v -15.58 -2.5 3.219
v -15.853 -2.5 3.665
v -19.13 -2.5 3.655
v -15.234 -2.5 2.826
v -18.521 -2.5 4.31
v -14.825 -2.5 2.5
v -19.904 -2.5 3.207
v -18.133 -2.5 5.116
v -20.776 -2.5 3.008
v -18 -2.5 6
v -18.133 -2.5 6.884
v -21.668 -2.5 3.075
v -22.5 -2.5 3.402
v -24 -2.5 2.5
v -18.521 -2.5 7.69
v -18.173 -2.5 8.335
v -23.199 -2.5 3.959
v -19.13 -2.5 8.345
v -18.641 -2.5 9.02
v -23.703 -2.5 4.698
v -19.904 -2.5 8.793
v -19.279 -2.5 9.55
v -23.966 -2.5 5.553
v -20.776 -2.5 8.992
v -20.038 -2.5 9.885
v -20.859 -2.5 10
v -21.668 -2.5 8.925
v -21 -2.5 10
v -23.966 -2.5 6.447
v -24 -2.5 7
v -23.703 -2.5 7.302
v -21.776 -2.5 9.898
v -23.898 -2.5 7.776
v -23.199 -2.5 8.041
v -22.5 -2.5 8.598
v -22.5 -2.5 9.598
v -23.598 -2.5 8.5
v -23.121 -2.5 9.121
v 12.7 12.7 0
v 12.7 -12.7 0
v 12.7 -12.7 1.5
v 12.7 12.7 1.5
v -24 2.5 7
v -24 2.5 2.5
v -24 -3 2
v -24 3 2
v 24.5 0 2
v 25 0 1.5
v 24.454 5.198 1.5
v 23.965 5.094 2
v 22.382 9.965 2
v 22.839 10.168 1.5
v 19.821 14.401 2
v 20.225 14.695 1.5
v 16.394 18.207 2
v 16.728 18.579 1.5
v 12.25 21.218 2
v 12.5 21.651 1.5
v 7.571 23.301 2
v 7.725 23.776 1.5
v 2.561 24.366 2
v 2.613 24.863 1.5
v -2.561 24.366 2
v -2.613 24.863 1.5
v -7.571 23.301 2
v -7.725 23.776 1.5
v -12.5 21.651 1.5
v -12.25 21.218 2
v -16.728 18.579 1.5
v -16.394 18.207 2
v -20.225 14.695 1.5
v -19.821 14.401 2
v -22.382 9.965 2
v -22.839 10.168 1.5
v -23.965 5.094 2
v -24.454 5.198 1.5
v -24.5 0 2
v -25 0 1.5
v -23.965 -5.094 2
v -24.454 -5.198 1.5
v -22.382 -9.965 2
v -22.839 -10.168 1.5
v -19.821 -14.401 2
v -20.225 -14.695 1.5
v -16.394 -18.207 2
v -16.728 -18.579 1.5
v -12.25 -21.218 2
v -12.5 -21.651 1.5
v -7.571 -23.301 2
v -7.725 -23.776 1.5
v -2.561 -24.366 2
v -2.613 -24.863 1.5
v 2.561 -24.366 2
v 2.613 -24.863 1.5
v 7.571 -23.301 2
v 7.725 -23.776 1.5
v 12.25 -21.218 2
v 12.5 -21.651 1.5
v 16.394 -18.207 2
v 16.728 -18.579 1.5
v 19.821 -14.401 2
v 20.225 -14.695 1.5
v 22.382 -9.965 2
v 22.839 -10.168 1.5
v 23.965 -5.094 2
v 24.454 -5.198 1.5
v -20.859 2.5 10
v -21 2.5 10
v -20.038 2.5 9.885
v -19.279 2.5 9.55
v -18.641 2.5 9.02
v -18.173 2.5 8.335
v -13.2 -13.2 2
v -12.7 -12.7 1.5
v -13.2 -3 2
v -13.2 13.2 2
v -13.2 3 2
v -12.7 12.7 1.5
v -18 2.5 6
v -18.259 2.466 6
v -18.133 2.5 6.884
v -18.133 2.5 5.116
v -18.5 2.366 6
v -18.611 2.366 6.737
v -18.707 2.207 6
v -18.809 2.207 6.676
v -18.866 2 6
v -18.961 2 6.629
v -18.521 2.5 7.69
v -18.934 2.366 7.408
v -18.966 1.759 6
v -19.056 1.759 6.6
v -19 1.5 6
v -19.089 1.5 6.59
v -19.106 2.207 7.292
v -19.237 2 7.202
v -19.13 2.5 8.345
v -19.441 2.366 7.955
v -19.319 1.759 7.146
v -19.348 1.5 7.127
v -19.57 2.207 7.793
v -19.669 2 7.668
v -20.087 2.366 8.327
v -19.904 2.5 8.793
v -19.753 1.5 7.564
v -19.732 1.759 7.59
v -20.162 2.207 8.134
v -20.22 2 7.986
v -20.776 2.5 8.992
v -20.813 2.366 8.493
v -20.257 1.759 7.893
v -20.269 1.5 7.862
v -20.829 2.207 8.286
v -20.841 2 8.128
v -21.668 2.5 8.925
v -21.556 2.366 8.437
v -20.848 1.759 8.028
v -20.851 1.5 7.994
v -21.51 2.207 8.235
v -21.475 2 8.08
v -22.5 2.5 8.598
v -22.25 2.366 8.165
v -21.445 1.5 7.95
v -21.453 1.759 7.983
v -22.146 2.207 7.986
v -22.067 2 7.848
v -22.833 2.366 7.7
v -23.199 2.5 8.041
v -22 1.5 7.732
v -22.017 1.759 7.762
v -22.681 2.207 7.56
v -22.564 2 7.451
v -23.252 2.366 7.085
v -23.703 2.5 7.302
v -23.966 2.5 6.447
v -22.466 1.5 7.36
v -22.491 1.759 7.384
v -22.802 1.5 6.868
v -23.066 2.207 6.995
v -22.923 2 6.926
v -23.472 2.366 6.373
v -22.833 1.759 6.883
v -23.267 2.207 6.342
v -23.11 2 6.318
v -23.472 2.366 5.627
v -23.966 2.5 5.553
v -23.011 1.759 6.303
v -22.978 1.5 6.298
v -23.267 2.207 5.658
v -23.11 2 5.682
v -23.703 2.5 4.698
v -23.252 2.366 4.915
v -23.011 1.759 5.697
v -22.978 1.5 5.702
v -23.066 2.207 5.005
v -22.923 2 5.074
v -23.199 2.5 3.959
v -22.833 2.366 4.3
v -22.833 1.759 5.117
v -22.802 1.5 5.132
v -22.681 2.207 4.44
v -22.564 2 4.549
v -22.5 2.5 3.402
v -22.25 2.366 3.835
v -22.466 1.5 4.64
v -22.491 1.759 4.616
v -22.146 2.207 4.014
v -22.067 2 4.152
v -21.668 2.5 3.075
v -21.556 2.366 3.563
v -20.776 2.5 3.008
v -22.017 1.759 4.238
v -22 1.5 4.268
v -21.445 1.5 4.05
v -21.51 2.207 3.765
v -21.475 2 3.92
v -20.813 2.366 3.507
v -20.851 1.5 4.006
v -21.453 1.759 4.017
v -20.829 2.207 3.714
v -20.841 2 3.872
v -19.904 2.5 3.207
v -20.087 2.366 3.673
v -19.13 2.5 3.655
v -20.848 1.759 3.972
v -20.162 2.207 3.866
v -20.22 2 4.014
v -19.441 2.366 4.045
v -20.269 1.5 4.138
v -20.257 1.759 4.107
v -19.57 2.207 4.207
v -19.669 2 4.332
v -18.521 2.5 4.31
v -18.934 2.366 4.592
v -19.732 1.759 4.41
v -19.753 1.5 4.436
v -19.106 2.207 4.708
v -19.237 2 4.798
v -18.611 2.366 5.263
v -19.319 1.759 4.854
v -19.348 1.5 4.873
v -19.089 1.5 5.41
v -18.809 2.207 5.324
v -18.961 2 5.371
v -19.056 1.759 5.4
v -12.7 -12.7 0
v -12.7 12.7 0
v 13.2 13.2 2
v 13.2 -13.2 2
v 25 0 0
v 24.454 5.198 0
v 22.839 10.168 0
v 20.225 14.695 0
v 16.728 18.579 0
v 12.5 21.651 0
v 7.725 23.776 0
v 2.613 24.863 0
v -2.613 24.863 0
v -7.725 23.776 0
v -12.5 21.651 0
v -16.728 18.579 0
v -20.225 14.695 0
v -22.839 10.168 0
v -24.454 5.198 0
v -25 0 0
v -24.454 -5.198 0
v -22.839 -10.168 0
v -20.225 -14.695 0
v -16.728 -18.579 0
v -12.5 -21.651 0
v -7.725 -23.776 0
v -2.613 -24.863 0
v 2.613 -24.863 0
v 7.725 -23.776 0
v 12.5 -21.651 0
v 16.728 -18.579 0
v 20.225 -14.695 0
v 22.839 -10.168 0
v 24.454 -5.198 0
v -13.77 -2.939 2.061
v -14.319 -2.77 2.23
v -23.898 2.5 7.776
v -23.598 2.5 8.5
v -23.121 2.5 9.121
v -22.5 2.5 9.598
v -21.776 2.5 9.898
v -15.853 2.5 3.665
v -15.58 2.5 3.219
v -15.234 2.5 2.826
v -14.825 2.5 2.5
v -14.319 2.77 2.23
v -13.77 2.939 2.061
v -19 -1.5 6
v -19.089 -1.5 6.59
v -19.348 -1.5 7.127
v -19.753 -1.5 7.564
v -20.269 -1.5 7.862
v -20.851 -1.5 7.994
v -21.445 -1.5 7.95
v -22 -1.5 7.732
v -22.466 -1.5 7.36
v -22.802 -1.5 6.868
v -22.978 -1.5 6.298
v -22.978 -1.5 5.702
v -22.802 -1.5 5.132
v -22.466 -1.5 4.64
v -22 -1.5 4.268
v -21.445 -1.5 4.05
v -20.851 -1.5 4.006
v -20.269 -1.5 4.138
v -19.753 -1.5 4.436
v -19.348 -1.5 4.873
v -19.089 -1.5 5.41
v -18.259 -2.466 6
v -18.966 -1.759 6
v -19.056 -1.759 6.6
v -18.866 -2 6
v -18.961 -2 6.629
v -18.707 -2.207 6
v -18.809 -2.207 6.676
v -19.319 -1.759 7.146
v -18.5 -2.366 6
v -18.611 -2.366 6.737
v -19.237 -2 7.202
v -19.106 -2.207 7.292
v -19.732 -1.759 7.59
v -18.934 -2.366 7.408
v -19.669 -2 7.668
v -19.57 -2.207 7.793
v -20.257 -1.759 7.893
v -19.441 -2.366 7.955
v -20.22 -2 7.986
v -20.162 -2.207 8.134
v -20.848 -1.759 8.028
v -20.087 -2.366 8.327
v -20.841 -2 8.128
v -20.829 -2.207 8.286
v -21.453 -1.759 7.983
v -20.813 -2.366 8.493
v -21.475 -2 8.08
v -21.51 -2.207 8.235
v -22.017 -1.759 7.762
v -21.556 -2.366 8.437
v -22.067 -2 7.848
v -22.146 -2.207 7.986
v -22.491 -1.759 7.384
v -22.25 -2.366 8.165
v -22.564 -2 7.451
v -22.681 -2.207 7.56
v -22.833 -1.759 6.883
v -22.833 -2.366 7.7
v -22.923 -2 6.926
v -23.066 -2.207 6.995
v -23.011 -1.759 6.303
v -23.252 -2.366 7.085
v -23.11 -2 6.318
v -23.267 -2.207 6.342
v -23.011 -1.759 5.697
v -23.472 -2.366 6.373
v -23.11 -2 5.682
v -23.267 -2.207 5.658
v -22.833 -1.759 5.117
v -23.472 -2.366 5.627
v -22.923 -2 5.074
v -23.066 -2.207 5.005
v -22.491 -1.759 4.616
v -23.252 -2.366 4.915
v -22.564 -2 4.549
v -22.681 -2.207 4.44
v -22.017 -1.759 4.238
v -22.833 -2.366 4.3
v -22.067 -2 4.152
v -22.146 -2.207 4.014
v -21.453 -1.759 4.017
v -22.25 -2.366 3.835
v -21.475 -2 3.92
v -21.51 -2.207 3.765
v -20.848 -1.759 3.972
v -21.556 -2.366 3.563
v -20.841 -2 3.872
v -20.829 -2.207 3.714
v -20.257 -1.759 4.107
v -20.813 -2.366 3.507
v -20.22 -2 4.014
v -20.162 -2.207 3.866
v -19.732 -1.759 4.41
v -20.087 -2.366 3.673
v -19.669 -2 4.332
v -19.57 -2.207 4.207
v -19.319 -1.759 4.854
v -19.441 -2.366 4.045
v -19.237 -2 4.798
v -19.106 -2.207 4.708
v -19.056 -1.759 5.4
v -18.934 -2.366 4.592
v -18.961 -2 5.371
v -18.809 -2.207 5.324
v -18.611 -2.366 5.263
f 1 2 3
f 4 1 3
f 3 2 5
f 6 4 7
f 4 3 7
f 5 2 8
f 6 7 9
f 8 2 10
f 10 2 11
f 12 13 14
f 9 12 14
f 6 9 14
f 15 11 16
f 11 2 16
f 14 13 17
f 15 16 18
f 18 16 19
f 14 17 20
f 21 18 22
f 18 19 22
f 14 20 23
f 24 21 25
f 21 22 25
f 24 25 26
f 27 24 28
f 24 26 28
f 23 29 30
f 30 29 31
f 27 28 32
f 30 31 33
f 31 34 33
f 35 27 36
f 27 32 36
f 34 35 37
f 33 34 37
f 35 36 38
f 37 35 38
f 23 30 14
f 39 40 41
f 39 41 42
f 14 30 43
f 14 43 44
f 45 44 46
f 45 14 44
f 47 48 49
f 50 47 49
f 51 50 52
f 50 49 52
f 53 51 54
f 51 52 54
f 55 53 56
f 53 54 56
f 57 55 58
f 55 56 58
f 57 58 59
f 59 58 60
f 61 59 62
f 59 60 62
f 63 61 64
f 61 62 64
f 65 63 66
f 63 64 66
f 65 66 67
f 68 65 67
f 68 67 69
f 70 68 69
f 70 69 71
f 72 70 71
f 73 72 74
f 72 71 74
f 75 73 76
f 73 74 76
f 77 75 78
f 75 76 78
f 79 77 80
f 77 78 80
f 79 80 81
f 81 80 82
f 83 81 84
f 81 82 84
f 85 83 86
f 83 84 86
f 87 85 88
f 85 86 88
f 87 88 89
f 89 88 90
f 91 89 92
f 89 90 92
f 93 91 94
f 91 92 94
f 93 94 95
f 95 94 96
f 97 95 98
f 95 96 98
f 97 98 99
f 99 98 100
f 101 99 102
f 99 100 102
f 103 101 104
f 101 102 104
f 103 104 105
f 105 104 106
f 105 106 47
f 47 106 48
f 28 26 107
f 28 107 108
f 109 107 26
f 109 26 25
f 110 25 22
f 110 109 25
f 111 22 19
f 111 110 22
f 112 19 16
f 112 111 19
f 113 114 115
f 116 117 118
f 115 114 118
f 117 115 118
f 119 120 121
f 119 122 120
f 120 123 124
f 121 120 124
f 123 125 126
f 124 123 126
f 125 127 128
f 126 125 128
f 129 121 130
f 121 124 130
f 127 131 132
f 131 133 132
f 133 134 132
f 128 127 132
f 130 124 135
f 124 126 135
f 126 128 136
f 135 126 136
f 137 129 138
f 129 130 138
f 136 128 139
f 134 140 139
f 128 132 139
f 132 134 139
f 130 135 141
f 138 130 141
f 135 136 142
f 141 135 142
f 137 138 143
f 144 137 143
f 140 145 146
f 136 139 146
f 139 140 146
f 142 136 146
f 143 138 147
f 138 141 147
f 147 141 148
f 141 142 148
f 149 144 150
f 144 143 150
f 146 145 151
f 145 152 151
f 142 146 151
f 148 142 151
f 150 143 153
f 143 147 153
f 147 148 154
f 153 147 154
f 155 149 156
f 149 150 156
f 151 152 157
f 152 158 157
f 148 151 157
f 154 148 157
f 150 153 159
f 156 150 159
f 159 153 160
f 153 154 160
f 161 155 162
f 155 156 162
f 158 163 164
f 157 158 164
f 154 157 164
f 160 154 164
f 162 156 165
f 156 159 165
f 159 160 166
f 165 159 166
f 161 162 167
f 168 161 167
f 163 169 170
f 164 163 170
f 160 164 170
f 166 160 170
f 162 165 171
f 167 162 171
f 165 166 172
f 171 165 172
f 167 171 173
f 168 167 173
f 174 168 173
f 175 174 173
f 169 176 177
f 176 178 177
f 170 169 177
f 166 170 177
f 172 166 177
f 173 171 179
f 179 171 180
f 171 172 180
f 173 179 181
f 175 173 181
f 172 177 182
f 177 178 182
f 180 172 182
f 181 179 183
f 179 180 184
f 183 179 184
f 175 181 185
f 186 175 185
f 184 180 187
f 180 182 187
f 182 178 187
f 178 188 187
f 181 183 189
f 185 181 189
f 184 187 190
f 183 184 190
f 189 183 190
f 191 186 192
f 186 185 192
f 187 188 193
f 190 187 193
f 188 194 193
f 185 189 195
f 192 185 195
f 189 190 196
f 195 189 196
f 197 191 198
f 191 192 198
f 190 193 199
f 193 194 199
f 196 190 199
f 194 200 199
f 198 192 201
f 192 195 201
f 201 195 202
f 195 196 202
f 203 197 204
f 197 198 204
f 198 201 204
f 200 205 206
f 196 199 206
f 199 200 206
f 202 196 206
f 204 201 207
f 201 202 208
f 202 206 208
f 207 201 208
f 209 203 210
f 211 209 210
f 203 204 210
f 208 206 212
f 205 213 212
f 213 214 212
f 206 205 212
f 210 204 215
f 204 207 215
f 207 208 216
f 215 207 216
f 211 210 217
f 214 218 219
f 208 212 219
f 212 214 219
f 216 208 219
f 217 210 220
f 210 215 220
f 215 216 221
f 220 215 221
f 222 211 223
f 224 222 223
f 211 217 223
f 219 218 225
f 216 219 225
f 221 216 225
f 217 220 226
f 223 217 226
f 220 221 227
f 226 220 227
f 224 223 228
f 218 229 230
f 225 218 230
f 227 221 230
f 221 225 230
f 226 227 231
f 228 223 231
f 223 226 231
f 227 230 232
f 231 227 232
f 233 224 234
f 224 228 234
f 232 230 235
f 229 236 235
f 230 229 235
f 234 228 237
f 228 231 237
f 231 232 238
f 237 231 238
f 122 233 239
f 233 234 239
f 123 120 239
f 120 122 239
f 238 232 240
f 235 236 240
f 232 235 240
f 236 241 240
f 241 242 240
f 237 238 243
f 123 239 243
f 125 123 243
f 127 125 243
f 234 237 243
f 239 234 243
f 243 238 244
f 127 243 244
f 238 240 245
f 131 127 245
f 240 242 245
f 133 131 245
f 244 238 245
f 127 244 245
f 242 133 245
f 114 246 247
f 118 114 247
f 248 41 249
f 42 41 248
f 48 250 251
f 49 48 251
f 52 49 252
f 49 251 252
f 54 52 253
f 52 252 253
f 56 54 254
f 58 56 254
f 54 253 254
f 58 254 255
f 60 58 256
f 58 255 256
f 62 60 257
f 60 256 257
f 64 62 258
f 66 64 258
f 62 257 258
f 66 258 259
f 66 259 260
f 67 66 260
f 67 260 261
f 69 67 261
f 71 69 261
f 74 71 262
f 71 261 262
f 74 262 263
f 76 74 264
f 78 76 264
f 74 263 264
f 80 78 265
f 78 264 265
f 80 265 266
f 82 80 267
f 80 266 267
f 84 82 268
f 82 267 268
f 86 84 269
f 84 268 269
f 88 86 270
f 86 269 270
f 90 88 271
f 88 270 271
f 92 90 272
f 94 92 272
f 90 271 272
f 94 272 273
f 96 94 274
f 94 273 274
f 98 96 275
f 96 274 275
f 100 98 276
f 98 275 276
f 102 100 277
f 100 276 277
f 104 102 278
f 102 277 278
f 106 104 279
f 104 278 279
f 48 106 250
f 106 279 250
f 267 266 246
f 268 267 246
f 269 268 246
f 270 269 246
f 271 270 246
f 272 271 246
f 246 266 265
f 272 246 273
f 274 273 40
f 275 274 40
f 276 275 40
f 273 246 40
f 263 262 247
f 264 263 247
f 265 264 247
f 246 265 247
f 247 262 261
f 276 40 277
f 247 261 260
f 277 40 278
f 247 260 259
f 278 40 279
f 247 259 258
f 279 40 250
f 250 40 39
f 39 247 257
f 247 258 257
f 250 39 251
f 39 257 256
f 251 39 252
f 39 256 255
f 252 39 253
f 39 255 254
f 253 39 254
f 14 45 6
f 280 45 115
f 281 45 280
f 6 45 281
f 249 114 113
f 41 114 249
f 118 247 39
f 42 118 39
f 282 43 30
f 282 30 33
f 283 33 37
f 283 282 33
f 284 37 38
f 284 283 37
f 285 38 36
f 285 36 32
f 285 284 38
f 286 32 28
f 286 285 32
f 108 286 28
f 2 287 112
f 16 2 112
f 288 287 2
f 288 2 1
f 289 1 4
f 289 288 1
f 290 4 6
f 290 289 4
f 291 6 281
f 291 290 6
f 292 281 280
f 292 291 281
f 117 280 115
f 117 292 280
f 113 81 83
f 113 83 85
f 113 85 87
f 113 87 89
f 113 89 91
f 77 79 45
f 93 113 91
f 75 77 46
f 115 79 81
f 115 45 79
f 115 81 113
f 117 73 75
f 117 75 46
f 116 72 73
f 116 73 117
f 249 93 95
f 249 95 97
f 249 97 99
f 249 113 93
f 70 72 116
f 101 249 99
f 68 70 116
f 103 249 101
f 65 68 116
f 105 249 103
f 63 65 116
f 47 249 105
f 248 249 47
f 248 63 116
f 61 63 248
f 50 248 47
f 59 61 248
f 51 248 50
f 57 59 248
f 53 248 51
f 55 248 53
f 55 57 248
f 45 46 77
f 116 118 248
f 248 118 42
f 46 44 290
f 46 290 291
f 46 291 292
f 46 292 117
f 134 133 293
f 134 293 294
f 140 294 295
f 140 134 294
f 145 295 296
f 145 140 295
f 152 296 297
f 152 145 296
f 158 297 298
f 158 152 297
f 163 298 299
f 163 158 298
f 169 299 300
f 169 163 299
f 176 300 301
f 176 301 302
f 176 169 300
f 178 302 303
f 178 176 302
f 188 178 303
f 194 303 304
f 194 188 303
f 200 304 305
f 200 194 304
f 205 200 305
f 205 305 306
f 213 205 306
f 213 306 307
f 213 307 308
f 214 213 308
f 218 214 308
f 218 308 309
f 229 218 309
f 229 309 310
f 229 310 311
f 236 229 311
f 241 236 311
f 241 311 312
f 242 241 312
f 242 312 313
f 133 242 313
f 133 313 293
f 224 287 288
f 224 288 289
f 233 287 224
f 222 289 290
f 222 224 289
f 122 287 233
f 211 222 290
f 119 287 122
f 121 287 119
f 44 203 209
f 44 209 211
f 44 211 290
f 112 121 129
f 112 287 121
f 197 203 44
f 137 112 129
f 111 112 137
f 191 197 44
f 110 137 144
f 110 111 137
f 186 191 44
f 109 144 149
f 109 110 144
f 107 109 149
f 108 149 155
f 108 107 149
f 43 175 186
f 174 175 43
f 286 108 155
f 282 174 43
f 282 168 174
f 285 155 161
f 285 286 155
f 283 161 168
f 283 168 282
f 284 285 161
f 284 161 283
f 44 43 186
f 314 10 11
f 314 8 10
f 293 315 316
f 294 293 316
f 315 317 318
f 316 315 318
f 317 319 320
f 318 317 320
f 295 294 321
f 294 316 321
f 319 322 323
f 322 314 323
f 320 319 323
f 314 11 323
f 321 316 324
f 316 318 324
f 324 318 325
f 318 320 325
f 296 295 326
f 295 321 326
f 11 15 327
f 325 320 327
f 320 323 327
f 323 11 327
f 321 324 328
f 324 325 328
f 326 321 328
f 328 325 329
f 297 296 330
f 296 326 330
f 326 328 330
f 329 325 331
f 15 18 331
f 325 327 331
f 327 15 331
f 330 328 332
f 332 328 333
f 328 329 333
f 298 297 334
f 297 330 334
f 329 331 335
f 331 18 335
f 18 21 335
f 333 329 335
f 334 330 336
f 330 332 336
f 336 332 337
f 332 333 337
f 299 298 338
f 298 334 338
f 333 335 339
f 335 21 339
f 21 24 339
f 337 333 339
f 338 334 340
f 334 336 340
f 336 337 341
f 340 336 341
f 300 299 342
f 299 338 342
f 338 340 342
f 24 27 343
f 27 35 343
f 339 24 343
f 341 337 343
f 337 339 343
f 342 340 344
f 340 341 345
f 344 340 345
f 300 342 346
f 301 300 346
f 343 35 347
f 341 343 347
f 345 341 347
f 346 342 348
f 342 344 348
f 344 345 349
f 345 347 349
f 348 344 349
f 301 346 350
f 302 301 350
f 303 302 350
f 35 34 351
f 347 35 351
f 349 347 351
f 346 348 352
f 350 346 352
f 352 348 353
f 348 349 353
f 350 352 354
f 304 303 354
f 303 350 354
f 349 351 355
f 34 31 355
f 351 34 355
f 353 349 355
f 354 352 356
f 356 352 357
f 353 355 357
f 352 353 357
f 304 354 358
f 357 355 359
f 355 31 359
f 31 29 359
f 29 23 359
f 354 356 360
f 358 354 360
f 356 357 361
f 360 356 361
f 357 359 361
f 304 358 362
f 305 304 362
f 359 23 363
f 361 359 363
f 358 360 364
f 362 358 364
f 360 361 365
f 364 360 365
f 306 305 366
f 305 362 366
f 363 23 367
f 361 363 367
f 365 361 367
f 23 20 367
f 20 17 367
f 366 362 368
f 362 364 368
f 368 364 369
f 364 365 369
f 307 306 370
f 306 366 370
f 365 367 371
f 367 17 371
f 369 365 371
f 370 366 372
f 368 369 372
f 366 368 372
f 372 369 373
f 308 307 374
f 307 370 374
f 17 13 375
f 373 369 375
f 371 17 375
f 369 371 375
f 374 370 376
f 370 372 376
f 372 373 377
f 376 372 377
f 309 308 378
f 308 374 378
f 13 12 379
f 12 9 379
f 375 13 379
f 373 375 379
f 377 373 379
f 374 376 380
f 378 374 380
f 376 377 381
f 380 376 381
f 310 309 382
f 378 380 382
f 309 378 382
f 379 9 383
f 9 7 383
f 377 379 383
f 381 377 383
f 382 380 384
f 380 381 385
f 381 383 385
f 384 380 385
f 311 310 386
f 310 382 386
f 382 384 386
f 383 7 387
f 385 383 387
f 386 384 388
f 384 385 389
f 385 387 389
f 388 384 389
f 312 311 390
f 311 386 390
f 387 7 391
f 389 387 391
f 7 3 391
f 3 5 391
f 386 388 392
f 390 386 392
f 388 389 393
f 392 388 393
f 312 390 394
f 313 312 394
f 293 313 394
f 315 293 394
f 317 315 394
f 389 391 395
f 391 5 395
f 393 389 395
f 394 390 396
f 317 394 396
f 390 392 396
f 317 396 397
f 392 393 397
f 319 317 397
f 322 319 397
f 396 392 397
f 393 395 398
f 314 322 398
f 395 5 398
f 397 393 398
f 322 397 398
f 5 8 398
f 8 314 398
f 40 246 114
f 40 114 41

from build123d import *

# Parameters (mm, degrees)
F0_R          = 25
F0_W          = 25.4
F0_H          = 25.4
F1_DEPTH      = 2
F2_R          = 2
F3_DEPTH      = 2.5
F3_DEPTH_BACK = 2.5
F4_SIZE       = 0.5
F5_R          = 0.99999
F6_T4_DEPTH   = 5
F6_T9_DEPTH   = 5.1486606532
F6_T15_DEPTH  = 5.1486606532
F6_T18_DEPTH  = 20
F6_T20_DEPTH  = 14.2973213065


# Not quite as in the source:
# - a fillet or chamfer that OpenCascade refuses, or shapes differently, is made with other operations: its cross-section is extruded or revolved along the edge and cut away or added
# - a fillet or chamfer is up to 0.001 mm smaller than in the source, because OpenCascade refuses the exact size


with BuildPart() as f1:
    # F0 (on Top) → F1 (new body)
    with BuildSketch(Plane.XY):
        Circle(F0_R)
        Rectangle(F0_W, F0_H, mode=Mode.SUBTRACT)
    extrude(amount=F1_DEPTH)

    # F2 (on Front) → F3 (join, two sides)
    with BuildSketch(Plane.XZ) as f3_sk:
        Polygon((-24, 10), (-24, 1.4085747534), (-14.7320097312, 1.4085747534), (-19, 10), align=None)
        with Locations((-21, 6)):
            Circle(F2_R, mode=Mode.SUBTRACT)
    extrude(amount=F3_DEPTH)
    extrude(f3_sk.sketch, amount=-F3_DEPTH_BACK)

    # F4
    f4_edges = [f1.edges().sort_by_distance(p)[0] for p in [
        (0, 12.7, 2),
        (12.7, 0, 2),
        (0, -12.7, 2),
        (-12.7, 0, 2),
        (-25, 0, 2),
        (-19.512907, 2.5, 2),
        (-19.512907, -2.5, 2),
    ]]
    chamfer(f4_edges, length=F4_SIZE)

    # F5 (radius 1 in the source; OpenCascade refuses exactly that, so slightly less here)
    f5_edges = [f1.edges().sort_by_distance(p)[0] for p in [
        (-23, -2.5, 6),
        (-23, 2.5, 6),
    ]]
    fillet(f5_edges, radius=F5_R)

    # F6: fillet of radius 3 on 3 edges, made by hand


with BuildPart() as f6_tool2:
    # F6_s3 → F6_t4 (new body)
    with BuildSketch(Plane.XZ.offset(-2.5)):
        with BuildLine():
            ThreePointArc((-15.8530900959, 3.66529924), (-14.7468397832, 2.4500880133), (-13.1663497137, 2))
            Line((-13.1663497137, 2), (-15.025813975, 2))
            Line((-15.025813975, 2), (-15.8530900959, 3.66529924))
        make_face()
    extrude(amount=F6_T4_DEPTH)

    split(bisect_by=Plane(origin=(-5.6, 0, -5.6), x_dir=(0, 1, 0), z_dir=(-0.7071067812, 0, -0.7071067812)), keep=Keep.TOP)


with BuildPart() as f1_1:
    add(f1.part)

    # F6_t1: union F6_tool2
    add(f6_tool2.part)


with BuildPart() as f6_tool7:
    # F6_s8 → F6_t9 (new body)
    with BuildSketch(Plane.XZ.offset(-2.5)):
        with BuildLine():
            ThreePointArc((-15.8530900959, 3.66529924), (-14.7468397832, 2.4500880133), (-13.1663497137, 2))
            Line((-13.1663497137, 2), (-15.025813975, 2))
            Line((-15.025813975, 2), (-15.8530900959, 3.66529924))
        make_face()
    extrude(amount=-F6_T9_DEPTH)

    split(bisect_by=Plane(origin=(0, 2.5, 2.5), x_dir=(1, 0, 0), z_dir=(0, -0.7071067812, -0.7071067812)), keep=Keep.TOP)

    split(bisect_by=Plane(origin=(-5.6, 0, -5.6), x_dir=(0, 1, 0), z_dir=(-0.7071067812, 0, -0.7071067812)), keep=Keep.TOP)


with BuildPart() as f1_2:
    add(f1_1.part)

    # F6_t6: union F6_tool7
    add(f6_tool7.part)


with BuildPart() as f6_tool13:
    # F6_s14 → F6_t15 (new body)
    with BuildSketch(Plane.XZ.offset(2.5)):
        with BuildLine():
            ThreePointArc((-15.8530900959, 3.66529924), (-14.7468397832, 2.4500880133), (-13.1663497137, 2))
            Line((-13.1663497137, 2), (-15.025813975, 2))
            Line((-15.025813975, 2), (-15.8530900959, 3.66529924))
        make_face()
    extrude(amount=F6_T15_DEPTH)

    split(bisect_by=Plane(origin=(0, -2.5, 2.5), x_dir=(1, 0, 0), z_dir=(0, 0.7071067812, -0.7071067812)), keep=Keep.TOP)

    split(bisect_by=Plane(origin=(-5.6, 0, -5.6), x_dir=(0, 1, 0), z_dir=(-0.7071067812, 0, -0.7071067812)), keep=Keep.TOP)


with BuildPart() as f1_3:
    add(f1_2.part)

    # F6_t12: union F6_tool13
    add(f6_tool13.part)

    # F6_s19 → F6_t18 (cut)
    with BuildSketch(Plane.XZ.offset(-10)):
        with BuildLine():
            ThreePointArc((-24, 7), (-23.1213203436, 9.1213203436), (-21, 10))
            Line((-21, 10), (-24, 10))
            Line((-24, 10), (-24, 7))
        make_face()
    extrude(amount=F6_T18_DEPTH, mode=Mode.SUBTRACT)

    # F6_s21 → F6_t20 (cut)
    with BuildSketch(Plane.XZ.offset(-7.1486606532)):
        with BuildLine():
            ThreePointArc((-20.8594642613, 10), (-19.2789741917, 9.5499119867), (-18.1727238791, 8.33470076))
            Line((-18.1727238791, 8.33470076), (-19, 10))
            Line((-19, 10), (-20.8594642613, 10))
        make_face()
    extrude(amount=F6_T20_DEPTH, mode=Mode.SUBTRACT)


solid = f1_3.part
